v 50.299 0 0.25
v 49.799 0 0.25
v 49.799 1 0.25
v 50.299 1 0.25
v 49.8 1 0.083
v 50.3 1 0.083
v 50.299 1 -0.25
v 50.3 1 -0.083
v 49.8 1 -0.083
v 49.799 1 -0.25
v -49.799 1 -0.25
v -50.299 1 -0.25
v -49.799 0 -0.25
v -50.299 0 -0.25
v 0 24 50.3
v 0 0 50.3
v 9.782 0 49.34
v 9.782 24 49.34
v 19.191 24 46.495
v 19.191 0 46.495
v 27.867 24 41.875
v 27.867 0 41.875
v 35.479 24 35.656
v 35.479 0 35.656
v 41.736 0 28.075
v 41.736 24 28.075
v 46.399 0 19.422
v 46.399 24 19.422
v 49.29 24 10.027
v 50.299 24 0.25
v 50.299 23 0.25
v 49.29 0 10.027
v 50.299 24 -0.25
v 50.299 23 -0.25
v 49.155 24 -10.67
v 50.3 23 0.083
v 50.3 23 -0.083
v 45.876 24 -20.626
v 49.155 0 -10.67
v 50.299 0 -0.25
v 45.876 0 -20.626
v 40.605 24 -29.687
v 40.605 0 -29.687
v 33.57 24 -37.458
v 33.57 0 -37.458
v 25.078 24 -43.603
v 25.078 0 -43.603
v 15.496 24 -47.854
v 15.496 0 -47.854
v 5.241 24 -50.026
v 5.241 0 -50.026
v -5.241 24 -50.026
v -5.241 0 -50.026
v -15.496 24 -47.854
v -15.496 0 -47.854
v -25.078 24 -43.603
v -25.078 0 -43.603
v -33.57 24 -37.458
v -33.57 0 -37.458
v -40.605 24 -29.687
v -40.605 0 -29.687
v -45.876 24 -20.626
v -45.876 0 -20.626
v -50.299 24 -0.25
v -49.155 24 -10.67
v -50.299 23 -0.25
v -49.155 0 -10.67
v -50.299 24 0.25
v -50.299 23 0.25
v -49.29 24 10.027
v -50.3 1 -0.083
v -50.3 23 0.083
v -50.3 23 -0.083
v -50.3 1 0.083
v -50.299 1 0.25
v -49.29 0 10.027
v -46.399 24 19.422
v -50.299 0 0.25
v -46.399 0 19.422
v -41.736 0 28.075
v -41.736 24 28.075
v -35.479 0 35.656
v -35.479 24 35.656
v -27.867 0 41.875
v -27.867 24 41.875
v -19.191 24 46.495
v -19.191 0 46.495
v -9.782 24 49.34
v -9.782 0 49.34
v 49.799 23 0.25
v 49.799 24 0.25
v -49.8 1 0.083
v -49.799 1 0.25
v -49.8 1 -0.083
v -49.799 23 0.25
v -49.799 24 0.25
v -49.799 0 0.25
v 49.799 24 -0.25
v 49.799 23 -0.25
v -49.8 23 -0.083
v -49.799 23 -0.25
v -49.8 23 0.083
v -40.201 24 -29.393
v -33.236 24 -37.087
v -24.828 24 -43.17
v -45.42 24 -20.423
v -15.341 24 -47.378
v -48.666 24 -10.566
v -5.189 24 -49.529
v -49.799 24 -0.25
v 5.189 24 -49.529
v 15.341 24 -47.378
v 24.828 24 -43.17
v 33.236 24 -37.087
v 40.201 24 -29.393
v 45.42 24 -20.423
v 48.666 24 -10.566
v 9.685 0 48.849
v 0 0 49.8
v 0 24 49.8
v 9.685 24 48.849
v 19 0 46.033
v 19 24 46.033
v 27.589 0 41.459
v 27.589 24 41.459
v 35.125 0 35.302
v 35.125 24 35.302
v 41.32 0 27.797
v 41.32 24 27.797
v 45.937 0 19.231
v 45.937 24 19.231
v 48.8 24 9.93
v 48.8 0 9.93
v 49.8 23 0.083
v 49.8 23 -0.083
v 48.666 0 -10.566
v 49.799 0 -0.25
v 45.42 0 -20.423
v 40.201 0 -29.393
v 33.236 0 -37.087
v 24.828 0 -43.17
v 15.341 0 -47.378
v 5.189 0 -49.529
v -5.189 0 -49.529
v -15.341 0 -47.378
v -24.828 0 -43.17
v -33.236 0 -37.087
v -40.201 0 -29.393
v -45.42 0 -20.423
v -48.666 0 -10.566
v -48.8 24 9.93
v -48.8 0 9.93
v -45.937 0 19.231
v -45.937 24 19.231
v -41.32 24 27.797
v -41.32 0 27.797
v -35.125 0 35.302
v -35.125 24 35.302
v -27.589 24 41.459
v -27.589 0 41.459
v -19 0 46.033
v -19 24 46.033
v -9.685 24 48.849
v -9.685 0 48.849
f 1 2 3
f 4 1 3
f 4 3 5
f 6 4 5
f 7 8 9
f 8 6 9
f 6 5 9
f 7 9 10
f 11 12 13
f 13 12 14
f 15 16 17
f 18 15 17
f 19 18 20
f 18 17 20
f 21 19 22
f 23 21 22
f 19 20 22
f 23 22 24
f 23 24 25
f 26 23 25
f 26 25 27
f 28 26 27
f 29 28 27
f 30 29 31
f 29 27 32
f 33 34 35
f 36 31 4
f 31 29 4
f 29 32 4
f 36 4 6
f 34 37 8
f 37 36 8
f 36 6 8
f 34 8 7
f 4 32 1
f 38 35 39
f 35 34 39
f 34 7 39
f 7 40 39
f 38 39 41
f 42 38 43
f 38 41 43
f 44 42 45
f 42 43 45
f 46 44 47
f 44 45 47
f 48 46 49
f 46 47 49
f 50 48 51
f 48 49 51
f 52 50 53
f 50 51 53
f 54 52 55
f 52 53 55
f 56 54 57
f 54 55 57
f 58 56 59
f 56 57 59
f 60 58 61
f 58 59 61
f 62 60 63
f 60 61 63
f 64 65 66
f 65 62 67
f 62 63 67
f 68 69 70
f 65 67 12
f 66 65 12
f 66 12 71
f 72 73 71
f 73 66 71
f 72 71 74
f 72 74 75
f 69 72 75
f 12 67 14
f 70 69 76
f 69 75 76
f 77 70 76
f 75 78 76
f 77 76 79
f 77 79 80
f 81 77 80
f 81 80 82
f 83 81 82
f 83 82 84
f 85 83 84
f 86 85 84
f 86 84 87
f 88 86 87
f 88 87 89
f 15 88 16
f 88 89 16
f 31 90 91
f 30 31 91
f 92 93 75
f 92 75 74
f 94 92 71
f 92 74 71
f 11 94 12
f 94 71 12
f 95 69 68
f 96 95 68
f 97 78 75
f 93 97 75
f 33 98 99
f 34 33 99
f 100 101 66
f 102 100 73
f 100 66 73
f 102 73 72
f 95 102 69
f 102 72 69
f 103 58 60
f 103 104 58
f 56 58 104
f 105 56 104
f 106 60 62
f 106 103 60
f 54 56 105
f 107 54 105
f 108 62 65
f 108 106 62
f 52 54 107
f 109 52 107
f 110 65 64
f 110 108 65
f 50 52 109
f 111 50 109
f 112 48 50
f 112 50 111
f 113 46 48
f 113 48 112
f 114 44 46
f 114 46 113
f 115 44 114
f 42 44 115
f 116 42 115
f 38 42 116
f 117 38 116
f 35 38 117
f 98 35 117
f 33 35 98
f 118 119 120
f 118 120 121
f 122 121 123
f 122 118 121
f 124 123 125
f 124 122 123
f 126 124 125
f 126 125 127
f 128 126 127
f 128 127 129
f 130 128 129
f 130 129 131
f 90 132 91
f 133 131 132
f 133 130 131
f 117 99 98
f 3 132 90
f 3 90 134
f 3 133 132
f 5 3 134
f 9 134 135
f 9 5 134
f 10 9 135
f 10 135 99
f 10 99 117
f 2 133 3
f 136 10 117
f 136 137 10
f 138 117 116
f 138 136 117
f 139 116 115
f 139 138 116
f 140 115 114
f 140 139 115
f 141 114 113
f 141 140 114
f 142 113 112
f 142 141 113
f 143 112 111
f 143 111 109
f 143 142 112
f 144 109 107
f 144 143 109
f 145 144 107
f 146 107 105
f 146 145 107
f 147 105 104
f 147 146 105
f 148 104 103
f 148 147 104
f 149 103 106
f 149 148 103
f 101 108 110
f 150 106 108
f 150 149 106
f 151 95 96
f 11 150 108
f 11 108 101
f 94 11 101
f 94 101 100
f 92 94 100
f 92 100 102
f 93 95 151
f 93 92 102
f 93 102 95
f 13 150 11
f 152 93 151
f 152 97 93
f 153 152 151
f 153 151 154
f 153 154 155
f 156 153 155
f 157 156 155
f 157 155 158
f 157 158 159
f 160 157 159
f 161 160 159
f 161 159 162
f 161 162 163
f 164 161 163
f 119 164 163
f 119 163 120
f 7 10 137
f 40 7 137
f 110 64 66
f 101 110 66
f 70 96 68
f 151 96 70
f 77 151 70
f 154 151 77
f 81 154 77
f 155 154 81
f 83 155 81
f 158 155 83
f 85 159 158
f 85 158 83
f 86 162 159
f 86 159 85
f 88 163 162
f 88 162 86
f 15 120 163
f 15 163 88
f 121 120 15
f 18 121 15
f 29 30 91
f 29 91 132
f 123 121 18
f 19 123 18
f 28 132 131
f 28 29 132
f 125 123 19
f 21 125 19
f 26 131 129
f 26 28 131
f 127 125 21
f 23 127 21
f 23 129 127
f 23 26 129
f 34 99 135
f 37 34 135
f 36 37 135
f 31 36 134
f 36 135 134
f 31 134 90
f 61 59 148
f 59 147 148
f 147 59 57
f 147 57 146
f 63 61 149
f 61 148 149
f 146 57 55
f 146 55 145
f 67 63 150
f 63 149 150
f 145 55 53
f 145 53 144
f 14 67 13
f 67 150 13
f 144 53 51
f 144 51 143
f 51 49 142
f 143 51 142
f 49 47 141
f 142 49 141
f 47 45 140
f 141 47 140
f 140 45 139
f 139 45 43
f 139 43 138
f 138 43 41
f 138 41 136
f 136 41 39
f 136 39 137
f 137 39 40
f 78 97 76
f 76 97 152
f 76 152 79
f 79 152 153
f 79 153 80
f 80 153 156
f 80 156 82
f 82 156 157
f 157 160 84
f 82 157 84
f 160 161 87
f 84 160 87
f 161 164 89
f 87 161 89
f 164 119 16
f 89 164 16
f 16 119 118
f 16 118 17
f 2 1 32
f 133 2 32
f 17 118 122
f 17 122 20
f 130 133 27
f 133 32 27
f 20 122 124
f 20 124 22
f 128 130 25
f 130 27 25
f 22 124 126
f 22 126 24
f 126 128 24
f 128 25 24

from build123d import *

# Parameters (mm, degrees)
SKETCH_1_R               = 50.3
SKETCH_1_R_2             = 49.8
EXTRUDE_1_DEPTH          = 24
CUT_EXTRUDE_2_DEPTH      = 52
CUT_EXTRUDE_2_DEPTH_BACK = 52


with BuildPart() as part:
    # Эскиз1 → Бобышка-Вытянуть1 (new body)
    with BuildSketch(Plane(origin=(0, 0, 0), x_dir=(1, 0, 0), z_dir=(0, 1, 0))):
        Circle(SKETCH_1_R)
        Circle(SKETCH_1_R_2, mode=Mode.SUBTRACT)
    extrude(amount=EXTRUDE_1_DEPTH)

    # Эскиз3 → Вырез-Вытянуть2 (cut, two sides: drawn at the far end of the back side and taken through both)
    with BuildSketch(Plane(origin=(0, 0, 0), x_dir=(0, 0, -1), z_dir=(1, 0, 0)).offset(-CUT_EXTRUDE_2_DEPTH_BACK)):
        Polygon((0, 24), (0.25, 24), (0.25, 23), (-0.25, 23), (-0.25, 24), align=None)
        Polygon((0.25, 1), (0.25, 0), (0, 0), (-0.25, 0), (-0.25, 1), align=None)
    extrude(amount=CUT_EXTRUDE_2_DEPTH + CUT_EXTRUDE_2_DEPTH_BACK, mode=Mode.SUBTRACT)


solid = part.part
